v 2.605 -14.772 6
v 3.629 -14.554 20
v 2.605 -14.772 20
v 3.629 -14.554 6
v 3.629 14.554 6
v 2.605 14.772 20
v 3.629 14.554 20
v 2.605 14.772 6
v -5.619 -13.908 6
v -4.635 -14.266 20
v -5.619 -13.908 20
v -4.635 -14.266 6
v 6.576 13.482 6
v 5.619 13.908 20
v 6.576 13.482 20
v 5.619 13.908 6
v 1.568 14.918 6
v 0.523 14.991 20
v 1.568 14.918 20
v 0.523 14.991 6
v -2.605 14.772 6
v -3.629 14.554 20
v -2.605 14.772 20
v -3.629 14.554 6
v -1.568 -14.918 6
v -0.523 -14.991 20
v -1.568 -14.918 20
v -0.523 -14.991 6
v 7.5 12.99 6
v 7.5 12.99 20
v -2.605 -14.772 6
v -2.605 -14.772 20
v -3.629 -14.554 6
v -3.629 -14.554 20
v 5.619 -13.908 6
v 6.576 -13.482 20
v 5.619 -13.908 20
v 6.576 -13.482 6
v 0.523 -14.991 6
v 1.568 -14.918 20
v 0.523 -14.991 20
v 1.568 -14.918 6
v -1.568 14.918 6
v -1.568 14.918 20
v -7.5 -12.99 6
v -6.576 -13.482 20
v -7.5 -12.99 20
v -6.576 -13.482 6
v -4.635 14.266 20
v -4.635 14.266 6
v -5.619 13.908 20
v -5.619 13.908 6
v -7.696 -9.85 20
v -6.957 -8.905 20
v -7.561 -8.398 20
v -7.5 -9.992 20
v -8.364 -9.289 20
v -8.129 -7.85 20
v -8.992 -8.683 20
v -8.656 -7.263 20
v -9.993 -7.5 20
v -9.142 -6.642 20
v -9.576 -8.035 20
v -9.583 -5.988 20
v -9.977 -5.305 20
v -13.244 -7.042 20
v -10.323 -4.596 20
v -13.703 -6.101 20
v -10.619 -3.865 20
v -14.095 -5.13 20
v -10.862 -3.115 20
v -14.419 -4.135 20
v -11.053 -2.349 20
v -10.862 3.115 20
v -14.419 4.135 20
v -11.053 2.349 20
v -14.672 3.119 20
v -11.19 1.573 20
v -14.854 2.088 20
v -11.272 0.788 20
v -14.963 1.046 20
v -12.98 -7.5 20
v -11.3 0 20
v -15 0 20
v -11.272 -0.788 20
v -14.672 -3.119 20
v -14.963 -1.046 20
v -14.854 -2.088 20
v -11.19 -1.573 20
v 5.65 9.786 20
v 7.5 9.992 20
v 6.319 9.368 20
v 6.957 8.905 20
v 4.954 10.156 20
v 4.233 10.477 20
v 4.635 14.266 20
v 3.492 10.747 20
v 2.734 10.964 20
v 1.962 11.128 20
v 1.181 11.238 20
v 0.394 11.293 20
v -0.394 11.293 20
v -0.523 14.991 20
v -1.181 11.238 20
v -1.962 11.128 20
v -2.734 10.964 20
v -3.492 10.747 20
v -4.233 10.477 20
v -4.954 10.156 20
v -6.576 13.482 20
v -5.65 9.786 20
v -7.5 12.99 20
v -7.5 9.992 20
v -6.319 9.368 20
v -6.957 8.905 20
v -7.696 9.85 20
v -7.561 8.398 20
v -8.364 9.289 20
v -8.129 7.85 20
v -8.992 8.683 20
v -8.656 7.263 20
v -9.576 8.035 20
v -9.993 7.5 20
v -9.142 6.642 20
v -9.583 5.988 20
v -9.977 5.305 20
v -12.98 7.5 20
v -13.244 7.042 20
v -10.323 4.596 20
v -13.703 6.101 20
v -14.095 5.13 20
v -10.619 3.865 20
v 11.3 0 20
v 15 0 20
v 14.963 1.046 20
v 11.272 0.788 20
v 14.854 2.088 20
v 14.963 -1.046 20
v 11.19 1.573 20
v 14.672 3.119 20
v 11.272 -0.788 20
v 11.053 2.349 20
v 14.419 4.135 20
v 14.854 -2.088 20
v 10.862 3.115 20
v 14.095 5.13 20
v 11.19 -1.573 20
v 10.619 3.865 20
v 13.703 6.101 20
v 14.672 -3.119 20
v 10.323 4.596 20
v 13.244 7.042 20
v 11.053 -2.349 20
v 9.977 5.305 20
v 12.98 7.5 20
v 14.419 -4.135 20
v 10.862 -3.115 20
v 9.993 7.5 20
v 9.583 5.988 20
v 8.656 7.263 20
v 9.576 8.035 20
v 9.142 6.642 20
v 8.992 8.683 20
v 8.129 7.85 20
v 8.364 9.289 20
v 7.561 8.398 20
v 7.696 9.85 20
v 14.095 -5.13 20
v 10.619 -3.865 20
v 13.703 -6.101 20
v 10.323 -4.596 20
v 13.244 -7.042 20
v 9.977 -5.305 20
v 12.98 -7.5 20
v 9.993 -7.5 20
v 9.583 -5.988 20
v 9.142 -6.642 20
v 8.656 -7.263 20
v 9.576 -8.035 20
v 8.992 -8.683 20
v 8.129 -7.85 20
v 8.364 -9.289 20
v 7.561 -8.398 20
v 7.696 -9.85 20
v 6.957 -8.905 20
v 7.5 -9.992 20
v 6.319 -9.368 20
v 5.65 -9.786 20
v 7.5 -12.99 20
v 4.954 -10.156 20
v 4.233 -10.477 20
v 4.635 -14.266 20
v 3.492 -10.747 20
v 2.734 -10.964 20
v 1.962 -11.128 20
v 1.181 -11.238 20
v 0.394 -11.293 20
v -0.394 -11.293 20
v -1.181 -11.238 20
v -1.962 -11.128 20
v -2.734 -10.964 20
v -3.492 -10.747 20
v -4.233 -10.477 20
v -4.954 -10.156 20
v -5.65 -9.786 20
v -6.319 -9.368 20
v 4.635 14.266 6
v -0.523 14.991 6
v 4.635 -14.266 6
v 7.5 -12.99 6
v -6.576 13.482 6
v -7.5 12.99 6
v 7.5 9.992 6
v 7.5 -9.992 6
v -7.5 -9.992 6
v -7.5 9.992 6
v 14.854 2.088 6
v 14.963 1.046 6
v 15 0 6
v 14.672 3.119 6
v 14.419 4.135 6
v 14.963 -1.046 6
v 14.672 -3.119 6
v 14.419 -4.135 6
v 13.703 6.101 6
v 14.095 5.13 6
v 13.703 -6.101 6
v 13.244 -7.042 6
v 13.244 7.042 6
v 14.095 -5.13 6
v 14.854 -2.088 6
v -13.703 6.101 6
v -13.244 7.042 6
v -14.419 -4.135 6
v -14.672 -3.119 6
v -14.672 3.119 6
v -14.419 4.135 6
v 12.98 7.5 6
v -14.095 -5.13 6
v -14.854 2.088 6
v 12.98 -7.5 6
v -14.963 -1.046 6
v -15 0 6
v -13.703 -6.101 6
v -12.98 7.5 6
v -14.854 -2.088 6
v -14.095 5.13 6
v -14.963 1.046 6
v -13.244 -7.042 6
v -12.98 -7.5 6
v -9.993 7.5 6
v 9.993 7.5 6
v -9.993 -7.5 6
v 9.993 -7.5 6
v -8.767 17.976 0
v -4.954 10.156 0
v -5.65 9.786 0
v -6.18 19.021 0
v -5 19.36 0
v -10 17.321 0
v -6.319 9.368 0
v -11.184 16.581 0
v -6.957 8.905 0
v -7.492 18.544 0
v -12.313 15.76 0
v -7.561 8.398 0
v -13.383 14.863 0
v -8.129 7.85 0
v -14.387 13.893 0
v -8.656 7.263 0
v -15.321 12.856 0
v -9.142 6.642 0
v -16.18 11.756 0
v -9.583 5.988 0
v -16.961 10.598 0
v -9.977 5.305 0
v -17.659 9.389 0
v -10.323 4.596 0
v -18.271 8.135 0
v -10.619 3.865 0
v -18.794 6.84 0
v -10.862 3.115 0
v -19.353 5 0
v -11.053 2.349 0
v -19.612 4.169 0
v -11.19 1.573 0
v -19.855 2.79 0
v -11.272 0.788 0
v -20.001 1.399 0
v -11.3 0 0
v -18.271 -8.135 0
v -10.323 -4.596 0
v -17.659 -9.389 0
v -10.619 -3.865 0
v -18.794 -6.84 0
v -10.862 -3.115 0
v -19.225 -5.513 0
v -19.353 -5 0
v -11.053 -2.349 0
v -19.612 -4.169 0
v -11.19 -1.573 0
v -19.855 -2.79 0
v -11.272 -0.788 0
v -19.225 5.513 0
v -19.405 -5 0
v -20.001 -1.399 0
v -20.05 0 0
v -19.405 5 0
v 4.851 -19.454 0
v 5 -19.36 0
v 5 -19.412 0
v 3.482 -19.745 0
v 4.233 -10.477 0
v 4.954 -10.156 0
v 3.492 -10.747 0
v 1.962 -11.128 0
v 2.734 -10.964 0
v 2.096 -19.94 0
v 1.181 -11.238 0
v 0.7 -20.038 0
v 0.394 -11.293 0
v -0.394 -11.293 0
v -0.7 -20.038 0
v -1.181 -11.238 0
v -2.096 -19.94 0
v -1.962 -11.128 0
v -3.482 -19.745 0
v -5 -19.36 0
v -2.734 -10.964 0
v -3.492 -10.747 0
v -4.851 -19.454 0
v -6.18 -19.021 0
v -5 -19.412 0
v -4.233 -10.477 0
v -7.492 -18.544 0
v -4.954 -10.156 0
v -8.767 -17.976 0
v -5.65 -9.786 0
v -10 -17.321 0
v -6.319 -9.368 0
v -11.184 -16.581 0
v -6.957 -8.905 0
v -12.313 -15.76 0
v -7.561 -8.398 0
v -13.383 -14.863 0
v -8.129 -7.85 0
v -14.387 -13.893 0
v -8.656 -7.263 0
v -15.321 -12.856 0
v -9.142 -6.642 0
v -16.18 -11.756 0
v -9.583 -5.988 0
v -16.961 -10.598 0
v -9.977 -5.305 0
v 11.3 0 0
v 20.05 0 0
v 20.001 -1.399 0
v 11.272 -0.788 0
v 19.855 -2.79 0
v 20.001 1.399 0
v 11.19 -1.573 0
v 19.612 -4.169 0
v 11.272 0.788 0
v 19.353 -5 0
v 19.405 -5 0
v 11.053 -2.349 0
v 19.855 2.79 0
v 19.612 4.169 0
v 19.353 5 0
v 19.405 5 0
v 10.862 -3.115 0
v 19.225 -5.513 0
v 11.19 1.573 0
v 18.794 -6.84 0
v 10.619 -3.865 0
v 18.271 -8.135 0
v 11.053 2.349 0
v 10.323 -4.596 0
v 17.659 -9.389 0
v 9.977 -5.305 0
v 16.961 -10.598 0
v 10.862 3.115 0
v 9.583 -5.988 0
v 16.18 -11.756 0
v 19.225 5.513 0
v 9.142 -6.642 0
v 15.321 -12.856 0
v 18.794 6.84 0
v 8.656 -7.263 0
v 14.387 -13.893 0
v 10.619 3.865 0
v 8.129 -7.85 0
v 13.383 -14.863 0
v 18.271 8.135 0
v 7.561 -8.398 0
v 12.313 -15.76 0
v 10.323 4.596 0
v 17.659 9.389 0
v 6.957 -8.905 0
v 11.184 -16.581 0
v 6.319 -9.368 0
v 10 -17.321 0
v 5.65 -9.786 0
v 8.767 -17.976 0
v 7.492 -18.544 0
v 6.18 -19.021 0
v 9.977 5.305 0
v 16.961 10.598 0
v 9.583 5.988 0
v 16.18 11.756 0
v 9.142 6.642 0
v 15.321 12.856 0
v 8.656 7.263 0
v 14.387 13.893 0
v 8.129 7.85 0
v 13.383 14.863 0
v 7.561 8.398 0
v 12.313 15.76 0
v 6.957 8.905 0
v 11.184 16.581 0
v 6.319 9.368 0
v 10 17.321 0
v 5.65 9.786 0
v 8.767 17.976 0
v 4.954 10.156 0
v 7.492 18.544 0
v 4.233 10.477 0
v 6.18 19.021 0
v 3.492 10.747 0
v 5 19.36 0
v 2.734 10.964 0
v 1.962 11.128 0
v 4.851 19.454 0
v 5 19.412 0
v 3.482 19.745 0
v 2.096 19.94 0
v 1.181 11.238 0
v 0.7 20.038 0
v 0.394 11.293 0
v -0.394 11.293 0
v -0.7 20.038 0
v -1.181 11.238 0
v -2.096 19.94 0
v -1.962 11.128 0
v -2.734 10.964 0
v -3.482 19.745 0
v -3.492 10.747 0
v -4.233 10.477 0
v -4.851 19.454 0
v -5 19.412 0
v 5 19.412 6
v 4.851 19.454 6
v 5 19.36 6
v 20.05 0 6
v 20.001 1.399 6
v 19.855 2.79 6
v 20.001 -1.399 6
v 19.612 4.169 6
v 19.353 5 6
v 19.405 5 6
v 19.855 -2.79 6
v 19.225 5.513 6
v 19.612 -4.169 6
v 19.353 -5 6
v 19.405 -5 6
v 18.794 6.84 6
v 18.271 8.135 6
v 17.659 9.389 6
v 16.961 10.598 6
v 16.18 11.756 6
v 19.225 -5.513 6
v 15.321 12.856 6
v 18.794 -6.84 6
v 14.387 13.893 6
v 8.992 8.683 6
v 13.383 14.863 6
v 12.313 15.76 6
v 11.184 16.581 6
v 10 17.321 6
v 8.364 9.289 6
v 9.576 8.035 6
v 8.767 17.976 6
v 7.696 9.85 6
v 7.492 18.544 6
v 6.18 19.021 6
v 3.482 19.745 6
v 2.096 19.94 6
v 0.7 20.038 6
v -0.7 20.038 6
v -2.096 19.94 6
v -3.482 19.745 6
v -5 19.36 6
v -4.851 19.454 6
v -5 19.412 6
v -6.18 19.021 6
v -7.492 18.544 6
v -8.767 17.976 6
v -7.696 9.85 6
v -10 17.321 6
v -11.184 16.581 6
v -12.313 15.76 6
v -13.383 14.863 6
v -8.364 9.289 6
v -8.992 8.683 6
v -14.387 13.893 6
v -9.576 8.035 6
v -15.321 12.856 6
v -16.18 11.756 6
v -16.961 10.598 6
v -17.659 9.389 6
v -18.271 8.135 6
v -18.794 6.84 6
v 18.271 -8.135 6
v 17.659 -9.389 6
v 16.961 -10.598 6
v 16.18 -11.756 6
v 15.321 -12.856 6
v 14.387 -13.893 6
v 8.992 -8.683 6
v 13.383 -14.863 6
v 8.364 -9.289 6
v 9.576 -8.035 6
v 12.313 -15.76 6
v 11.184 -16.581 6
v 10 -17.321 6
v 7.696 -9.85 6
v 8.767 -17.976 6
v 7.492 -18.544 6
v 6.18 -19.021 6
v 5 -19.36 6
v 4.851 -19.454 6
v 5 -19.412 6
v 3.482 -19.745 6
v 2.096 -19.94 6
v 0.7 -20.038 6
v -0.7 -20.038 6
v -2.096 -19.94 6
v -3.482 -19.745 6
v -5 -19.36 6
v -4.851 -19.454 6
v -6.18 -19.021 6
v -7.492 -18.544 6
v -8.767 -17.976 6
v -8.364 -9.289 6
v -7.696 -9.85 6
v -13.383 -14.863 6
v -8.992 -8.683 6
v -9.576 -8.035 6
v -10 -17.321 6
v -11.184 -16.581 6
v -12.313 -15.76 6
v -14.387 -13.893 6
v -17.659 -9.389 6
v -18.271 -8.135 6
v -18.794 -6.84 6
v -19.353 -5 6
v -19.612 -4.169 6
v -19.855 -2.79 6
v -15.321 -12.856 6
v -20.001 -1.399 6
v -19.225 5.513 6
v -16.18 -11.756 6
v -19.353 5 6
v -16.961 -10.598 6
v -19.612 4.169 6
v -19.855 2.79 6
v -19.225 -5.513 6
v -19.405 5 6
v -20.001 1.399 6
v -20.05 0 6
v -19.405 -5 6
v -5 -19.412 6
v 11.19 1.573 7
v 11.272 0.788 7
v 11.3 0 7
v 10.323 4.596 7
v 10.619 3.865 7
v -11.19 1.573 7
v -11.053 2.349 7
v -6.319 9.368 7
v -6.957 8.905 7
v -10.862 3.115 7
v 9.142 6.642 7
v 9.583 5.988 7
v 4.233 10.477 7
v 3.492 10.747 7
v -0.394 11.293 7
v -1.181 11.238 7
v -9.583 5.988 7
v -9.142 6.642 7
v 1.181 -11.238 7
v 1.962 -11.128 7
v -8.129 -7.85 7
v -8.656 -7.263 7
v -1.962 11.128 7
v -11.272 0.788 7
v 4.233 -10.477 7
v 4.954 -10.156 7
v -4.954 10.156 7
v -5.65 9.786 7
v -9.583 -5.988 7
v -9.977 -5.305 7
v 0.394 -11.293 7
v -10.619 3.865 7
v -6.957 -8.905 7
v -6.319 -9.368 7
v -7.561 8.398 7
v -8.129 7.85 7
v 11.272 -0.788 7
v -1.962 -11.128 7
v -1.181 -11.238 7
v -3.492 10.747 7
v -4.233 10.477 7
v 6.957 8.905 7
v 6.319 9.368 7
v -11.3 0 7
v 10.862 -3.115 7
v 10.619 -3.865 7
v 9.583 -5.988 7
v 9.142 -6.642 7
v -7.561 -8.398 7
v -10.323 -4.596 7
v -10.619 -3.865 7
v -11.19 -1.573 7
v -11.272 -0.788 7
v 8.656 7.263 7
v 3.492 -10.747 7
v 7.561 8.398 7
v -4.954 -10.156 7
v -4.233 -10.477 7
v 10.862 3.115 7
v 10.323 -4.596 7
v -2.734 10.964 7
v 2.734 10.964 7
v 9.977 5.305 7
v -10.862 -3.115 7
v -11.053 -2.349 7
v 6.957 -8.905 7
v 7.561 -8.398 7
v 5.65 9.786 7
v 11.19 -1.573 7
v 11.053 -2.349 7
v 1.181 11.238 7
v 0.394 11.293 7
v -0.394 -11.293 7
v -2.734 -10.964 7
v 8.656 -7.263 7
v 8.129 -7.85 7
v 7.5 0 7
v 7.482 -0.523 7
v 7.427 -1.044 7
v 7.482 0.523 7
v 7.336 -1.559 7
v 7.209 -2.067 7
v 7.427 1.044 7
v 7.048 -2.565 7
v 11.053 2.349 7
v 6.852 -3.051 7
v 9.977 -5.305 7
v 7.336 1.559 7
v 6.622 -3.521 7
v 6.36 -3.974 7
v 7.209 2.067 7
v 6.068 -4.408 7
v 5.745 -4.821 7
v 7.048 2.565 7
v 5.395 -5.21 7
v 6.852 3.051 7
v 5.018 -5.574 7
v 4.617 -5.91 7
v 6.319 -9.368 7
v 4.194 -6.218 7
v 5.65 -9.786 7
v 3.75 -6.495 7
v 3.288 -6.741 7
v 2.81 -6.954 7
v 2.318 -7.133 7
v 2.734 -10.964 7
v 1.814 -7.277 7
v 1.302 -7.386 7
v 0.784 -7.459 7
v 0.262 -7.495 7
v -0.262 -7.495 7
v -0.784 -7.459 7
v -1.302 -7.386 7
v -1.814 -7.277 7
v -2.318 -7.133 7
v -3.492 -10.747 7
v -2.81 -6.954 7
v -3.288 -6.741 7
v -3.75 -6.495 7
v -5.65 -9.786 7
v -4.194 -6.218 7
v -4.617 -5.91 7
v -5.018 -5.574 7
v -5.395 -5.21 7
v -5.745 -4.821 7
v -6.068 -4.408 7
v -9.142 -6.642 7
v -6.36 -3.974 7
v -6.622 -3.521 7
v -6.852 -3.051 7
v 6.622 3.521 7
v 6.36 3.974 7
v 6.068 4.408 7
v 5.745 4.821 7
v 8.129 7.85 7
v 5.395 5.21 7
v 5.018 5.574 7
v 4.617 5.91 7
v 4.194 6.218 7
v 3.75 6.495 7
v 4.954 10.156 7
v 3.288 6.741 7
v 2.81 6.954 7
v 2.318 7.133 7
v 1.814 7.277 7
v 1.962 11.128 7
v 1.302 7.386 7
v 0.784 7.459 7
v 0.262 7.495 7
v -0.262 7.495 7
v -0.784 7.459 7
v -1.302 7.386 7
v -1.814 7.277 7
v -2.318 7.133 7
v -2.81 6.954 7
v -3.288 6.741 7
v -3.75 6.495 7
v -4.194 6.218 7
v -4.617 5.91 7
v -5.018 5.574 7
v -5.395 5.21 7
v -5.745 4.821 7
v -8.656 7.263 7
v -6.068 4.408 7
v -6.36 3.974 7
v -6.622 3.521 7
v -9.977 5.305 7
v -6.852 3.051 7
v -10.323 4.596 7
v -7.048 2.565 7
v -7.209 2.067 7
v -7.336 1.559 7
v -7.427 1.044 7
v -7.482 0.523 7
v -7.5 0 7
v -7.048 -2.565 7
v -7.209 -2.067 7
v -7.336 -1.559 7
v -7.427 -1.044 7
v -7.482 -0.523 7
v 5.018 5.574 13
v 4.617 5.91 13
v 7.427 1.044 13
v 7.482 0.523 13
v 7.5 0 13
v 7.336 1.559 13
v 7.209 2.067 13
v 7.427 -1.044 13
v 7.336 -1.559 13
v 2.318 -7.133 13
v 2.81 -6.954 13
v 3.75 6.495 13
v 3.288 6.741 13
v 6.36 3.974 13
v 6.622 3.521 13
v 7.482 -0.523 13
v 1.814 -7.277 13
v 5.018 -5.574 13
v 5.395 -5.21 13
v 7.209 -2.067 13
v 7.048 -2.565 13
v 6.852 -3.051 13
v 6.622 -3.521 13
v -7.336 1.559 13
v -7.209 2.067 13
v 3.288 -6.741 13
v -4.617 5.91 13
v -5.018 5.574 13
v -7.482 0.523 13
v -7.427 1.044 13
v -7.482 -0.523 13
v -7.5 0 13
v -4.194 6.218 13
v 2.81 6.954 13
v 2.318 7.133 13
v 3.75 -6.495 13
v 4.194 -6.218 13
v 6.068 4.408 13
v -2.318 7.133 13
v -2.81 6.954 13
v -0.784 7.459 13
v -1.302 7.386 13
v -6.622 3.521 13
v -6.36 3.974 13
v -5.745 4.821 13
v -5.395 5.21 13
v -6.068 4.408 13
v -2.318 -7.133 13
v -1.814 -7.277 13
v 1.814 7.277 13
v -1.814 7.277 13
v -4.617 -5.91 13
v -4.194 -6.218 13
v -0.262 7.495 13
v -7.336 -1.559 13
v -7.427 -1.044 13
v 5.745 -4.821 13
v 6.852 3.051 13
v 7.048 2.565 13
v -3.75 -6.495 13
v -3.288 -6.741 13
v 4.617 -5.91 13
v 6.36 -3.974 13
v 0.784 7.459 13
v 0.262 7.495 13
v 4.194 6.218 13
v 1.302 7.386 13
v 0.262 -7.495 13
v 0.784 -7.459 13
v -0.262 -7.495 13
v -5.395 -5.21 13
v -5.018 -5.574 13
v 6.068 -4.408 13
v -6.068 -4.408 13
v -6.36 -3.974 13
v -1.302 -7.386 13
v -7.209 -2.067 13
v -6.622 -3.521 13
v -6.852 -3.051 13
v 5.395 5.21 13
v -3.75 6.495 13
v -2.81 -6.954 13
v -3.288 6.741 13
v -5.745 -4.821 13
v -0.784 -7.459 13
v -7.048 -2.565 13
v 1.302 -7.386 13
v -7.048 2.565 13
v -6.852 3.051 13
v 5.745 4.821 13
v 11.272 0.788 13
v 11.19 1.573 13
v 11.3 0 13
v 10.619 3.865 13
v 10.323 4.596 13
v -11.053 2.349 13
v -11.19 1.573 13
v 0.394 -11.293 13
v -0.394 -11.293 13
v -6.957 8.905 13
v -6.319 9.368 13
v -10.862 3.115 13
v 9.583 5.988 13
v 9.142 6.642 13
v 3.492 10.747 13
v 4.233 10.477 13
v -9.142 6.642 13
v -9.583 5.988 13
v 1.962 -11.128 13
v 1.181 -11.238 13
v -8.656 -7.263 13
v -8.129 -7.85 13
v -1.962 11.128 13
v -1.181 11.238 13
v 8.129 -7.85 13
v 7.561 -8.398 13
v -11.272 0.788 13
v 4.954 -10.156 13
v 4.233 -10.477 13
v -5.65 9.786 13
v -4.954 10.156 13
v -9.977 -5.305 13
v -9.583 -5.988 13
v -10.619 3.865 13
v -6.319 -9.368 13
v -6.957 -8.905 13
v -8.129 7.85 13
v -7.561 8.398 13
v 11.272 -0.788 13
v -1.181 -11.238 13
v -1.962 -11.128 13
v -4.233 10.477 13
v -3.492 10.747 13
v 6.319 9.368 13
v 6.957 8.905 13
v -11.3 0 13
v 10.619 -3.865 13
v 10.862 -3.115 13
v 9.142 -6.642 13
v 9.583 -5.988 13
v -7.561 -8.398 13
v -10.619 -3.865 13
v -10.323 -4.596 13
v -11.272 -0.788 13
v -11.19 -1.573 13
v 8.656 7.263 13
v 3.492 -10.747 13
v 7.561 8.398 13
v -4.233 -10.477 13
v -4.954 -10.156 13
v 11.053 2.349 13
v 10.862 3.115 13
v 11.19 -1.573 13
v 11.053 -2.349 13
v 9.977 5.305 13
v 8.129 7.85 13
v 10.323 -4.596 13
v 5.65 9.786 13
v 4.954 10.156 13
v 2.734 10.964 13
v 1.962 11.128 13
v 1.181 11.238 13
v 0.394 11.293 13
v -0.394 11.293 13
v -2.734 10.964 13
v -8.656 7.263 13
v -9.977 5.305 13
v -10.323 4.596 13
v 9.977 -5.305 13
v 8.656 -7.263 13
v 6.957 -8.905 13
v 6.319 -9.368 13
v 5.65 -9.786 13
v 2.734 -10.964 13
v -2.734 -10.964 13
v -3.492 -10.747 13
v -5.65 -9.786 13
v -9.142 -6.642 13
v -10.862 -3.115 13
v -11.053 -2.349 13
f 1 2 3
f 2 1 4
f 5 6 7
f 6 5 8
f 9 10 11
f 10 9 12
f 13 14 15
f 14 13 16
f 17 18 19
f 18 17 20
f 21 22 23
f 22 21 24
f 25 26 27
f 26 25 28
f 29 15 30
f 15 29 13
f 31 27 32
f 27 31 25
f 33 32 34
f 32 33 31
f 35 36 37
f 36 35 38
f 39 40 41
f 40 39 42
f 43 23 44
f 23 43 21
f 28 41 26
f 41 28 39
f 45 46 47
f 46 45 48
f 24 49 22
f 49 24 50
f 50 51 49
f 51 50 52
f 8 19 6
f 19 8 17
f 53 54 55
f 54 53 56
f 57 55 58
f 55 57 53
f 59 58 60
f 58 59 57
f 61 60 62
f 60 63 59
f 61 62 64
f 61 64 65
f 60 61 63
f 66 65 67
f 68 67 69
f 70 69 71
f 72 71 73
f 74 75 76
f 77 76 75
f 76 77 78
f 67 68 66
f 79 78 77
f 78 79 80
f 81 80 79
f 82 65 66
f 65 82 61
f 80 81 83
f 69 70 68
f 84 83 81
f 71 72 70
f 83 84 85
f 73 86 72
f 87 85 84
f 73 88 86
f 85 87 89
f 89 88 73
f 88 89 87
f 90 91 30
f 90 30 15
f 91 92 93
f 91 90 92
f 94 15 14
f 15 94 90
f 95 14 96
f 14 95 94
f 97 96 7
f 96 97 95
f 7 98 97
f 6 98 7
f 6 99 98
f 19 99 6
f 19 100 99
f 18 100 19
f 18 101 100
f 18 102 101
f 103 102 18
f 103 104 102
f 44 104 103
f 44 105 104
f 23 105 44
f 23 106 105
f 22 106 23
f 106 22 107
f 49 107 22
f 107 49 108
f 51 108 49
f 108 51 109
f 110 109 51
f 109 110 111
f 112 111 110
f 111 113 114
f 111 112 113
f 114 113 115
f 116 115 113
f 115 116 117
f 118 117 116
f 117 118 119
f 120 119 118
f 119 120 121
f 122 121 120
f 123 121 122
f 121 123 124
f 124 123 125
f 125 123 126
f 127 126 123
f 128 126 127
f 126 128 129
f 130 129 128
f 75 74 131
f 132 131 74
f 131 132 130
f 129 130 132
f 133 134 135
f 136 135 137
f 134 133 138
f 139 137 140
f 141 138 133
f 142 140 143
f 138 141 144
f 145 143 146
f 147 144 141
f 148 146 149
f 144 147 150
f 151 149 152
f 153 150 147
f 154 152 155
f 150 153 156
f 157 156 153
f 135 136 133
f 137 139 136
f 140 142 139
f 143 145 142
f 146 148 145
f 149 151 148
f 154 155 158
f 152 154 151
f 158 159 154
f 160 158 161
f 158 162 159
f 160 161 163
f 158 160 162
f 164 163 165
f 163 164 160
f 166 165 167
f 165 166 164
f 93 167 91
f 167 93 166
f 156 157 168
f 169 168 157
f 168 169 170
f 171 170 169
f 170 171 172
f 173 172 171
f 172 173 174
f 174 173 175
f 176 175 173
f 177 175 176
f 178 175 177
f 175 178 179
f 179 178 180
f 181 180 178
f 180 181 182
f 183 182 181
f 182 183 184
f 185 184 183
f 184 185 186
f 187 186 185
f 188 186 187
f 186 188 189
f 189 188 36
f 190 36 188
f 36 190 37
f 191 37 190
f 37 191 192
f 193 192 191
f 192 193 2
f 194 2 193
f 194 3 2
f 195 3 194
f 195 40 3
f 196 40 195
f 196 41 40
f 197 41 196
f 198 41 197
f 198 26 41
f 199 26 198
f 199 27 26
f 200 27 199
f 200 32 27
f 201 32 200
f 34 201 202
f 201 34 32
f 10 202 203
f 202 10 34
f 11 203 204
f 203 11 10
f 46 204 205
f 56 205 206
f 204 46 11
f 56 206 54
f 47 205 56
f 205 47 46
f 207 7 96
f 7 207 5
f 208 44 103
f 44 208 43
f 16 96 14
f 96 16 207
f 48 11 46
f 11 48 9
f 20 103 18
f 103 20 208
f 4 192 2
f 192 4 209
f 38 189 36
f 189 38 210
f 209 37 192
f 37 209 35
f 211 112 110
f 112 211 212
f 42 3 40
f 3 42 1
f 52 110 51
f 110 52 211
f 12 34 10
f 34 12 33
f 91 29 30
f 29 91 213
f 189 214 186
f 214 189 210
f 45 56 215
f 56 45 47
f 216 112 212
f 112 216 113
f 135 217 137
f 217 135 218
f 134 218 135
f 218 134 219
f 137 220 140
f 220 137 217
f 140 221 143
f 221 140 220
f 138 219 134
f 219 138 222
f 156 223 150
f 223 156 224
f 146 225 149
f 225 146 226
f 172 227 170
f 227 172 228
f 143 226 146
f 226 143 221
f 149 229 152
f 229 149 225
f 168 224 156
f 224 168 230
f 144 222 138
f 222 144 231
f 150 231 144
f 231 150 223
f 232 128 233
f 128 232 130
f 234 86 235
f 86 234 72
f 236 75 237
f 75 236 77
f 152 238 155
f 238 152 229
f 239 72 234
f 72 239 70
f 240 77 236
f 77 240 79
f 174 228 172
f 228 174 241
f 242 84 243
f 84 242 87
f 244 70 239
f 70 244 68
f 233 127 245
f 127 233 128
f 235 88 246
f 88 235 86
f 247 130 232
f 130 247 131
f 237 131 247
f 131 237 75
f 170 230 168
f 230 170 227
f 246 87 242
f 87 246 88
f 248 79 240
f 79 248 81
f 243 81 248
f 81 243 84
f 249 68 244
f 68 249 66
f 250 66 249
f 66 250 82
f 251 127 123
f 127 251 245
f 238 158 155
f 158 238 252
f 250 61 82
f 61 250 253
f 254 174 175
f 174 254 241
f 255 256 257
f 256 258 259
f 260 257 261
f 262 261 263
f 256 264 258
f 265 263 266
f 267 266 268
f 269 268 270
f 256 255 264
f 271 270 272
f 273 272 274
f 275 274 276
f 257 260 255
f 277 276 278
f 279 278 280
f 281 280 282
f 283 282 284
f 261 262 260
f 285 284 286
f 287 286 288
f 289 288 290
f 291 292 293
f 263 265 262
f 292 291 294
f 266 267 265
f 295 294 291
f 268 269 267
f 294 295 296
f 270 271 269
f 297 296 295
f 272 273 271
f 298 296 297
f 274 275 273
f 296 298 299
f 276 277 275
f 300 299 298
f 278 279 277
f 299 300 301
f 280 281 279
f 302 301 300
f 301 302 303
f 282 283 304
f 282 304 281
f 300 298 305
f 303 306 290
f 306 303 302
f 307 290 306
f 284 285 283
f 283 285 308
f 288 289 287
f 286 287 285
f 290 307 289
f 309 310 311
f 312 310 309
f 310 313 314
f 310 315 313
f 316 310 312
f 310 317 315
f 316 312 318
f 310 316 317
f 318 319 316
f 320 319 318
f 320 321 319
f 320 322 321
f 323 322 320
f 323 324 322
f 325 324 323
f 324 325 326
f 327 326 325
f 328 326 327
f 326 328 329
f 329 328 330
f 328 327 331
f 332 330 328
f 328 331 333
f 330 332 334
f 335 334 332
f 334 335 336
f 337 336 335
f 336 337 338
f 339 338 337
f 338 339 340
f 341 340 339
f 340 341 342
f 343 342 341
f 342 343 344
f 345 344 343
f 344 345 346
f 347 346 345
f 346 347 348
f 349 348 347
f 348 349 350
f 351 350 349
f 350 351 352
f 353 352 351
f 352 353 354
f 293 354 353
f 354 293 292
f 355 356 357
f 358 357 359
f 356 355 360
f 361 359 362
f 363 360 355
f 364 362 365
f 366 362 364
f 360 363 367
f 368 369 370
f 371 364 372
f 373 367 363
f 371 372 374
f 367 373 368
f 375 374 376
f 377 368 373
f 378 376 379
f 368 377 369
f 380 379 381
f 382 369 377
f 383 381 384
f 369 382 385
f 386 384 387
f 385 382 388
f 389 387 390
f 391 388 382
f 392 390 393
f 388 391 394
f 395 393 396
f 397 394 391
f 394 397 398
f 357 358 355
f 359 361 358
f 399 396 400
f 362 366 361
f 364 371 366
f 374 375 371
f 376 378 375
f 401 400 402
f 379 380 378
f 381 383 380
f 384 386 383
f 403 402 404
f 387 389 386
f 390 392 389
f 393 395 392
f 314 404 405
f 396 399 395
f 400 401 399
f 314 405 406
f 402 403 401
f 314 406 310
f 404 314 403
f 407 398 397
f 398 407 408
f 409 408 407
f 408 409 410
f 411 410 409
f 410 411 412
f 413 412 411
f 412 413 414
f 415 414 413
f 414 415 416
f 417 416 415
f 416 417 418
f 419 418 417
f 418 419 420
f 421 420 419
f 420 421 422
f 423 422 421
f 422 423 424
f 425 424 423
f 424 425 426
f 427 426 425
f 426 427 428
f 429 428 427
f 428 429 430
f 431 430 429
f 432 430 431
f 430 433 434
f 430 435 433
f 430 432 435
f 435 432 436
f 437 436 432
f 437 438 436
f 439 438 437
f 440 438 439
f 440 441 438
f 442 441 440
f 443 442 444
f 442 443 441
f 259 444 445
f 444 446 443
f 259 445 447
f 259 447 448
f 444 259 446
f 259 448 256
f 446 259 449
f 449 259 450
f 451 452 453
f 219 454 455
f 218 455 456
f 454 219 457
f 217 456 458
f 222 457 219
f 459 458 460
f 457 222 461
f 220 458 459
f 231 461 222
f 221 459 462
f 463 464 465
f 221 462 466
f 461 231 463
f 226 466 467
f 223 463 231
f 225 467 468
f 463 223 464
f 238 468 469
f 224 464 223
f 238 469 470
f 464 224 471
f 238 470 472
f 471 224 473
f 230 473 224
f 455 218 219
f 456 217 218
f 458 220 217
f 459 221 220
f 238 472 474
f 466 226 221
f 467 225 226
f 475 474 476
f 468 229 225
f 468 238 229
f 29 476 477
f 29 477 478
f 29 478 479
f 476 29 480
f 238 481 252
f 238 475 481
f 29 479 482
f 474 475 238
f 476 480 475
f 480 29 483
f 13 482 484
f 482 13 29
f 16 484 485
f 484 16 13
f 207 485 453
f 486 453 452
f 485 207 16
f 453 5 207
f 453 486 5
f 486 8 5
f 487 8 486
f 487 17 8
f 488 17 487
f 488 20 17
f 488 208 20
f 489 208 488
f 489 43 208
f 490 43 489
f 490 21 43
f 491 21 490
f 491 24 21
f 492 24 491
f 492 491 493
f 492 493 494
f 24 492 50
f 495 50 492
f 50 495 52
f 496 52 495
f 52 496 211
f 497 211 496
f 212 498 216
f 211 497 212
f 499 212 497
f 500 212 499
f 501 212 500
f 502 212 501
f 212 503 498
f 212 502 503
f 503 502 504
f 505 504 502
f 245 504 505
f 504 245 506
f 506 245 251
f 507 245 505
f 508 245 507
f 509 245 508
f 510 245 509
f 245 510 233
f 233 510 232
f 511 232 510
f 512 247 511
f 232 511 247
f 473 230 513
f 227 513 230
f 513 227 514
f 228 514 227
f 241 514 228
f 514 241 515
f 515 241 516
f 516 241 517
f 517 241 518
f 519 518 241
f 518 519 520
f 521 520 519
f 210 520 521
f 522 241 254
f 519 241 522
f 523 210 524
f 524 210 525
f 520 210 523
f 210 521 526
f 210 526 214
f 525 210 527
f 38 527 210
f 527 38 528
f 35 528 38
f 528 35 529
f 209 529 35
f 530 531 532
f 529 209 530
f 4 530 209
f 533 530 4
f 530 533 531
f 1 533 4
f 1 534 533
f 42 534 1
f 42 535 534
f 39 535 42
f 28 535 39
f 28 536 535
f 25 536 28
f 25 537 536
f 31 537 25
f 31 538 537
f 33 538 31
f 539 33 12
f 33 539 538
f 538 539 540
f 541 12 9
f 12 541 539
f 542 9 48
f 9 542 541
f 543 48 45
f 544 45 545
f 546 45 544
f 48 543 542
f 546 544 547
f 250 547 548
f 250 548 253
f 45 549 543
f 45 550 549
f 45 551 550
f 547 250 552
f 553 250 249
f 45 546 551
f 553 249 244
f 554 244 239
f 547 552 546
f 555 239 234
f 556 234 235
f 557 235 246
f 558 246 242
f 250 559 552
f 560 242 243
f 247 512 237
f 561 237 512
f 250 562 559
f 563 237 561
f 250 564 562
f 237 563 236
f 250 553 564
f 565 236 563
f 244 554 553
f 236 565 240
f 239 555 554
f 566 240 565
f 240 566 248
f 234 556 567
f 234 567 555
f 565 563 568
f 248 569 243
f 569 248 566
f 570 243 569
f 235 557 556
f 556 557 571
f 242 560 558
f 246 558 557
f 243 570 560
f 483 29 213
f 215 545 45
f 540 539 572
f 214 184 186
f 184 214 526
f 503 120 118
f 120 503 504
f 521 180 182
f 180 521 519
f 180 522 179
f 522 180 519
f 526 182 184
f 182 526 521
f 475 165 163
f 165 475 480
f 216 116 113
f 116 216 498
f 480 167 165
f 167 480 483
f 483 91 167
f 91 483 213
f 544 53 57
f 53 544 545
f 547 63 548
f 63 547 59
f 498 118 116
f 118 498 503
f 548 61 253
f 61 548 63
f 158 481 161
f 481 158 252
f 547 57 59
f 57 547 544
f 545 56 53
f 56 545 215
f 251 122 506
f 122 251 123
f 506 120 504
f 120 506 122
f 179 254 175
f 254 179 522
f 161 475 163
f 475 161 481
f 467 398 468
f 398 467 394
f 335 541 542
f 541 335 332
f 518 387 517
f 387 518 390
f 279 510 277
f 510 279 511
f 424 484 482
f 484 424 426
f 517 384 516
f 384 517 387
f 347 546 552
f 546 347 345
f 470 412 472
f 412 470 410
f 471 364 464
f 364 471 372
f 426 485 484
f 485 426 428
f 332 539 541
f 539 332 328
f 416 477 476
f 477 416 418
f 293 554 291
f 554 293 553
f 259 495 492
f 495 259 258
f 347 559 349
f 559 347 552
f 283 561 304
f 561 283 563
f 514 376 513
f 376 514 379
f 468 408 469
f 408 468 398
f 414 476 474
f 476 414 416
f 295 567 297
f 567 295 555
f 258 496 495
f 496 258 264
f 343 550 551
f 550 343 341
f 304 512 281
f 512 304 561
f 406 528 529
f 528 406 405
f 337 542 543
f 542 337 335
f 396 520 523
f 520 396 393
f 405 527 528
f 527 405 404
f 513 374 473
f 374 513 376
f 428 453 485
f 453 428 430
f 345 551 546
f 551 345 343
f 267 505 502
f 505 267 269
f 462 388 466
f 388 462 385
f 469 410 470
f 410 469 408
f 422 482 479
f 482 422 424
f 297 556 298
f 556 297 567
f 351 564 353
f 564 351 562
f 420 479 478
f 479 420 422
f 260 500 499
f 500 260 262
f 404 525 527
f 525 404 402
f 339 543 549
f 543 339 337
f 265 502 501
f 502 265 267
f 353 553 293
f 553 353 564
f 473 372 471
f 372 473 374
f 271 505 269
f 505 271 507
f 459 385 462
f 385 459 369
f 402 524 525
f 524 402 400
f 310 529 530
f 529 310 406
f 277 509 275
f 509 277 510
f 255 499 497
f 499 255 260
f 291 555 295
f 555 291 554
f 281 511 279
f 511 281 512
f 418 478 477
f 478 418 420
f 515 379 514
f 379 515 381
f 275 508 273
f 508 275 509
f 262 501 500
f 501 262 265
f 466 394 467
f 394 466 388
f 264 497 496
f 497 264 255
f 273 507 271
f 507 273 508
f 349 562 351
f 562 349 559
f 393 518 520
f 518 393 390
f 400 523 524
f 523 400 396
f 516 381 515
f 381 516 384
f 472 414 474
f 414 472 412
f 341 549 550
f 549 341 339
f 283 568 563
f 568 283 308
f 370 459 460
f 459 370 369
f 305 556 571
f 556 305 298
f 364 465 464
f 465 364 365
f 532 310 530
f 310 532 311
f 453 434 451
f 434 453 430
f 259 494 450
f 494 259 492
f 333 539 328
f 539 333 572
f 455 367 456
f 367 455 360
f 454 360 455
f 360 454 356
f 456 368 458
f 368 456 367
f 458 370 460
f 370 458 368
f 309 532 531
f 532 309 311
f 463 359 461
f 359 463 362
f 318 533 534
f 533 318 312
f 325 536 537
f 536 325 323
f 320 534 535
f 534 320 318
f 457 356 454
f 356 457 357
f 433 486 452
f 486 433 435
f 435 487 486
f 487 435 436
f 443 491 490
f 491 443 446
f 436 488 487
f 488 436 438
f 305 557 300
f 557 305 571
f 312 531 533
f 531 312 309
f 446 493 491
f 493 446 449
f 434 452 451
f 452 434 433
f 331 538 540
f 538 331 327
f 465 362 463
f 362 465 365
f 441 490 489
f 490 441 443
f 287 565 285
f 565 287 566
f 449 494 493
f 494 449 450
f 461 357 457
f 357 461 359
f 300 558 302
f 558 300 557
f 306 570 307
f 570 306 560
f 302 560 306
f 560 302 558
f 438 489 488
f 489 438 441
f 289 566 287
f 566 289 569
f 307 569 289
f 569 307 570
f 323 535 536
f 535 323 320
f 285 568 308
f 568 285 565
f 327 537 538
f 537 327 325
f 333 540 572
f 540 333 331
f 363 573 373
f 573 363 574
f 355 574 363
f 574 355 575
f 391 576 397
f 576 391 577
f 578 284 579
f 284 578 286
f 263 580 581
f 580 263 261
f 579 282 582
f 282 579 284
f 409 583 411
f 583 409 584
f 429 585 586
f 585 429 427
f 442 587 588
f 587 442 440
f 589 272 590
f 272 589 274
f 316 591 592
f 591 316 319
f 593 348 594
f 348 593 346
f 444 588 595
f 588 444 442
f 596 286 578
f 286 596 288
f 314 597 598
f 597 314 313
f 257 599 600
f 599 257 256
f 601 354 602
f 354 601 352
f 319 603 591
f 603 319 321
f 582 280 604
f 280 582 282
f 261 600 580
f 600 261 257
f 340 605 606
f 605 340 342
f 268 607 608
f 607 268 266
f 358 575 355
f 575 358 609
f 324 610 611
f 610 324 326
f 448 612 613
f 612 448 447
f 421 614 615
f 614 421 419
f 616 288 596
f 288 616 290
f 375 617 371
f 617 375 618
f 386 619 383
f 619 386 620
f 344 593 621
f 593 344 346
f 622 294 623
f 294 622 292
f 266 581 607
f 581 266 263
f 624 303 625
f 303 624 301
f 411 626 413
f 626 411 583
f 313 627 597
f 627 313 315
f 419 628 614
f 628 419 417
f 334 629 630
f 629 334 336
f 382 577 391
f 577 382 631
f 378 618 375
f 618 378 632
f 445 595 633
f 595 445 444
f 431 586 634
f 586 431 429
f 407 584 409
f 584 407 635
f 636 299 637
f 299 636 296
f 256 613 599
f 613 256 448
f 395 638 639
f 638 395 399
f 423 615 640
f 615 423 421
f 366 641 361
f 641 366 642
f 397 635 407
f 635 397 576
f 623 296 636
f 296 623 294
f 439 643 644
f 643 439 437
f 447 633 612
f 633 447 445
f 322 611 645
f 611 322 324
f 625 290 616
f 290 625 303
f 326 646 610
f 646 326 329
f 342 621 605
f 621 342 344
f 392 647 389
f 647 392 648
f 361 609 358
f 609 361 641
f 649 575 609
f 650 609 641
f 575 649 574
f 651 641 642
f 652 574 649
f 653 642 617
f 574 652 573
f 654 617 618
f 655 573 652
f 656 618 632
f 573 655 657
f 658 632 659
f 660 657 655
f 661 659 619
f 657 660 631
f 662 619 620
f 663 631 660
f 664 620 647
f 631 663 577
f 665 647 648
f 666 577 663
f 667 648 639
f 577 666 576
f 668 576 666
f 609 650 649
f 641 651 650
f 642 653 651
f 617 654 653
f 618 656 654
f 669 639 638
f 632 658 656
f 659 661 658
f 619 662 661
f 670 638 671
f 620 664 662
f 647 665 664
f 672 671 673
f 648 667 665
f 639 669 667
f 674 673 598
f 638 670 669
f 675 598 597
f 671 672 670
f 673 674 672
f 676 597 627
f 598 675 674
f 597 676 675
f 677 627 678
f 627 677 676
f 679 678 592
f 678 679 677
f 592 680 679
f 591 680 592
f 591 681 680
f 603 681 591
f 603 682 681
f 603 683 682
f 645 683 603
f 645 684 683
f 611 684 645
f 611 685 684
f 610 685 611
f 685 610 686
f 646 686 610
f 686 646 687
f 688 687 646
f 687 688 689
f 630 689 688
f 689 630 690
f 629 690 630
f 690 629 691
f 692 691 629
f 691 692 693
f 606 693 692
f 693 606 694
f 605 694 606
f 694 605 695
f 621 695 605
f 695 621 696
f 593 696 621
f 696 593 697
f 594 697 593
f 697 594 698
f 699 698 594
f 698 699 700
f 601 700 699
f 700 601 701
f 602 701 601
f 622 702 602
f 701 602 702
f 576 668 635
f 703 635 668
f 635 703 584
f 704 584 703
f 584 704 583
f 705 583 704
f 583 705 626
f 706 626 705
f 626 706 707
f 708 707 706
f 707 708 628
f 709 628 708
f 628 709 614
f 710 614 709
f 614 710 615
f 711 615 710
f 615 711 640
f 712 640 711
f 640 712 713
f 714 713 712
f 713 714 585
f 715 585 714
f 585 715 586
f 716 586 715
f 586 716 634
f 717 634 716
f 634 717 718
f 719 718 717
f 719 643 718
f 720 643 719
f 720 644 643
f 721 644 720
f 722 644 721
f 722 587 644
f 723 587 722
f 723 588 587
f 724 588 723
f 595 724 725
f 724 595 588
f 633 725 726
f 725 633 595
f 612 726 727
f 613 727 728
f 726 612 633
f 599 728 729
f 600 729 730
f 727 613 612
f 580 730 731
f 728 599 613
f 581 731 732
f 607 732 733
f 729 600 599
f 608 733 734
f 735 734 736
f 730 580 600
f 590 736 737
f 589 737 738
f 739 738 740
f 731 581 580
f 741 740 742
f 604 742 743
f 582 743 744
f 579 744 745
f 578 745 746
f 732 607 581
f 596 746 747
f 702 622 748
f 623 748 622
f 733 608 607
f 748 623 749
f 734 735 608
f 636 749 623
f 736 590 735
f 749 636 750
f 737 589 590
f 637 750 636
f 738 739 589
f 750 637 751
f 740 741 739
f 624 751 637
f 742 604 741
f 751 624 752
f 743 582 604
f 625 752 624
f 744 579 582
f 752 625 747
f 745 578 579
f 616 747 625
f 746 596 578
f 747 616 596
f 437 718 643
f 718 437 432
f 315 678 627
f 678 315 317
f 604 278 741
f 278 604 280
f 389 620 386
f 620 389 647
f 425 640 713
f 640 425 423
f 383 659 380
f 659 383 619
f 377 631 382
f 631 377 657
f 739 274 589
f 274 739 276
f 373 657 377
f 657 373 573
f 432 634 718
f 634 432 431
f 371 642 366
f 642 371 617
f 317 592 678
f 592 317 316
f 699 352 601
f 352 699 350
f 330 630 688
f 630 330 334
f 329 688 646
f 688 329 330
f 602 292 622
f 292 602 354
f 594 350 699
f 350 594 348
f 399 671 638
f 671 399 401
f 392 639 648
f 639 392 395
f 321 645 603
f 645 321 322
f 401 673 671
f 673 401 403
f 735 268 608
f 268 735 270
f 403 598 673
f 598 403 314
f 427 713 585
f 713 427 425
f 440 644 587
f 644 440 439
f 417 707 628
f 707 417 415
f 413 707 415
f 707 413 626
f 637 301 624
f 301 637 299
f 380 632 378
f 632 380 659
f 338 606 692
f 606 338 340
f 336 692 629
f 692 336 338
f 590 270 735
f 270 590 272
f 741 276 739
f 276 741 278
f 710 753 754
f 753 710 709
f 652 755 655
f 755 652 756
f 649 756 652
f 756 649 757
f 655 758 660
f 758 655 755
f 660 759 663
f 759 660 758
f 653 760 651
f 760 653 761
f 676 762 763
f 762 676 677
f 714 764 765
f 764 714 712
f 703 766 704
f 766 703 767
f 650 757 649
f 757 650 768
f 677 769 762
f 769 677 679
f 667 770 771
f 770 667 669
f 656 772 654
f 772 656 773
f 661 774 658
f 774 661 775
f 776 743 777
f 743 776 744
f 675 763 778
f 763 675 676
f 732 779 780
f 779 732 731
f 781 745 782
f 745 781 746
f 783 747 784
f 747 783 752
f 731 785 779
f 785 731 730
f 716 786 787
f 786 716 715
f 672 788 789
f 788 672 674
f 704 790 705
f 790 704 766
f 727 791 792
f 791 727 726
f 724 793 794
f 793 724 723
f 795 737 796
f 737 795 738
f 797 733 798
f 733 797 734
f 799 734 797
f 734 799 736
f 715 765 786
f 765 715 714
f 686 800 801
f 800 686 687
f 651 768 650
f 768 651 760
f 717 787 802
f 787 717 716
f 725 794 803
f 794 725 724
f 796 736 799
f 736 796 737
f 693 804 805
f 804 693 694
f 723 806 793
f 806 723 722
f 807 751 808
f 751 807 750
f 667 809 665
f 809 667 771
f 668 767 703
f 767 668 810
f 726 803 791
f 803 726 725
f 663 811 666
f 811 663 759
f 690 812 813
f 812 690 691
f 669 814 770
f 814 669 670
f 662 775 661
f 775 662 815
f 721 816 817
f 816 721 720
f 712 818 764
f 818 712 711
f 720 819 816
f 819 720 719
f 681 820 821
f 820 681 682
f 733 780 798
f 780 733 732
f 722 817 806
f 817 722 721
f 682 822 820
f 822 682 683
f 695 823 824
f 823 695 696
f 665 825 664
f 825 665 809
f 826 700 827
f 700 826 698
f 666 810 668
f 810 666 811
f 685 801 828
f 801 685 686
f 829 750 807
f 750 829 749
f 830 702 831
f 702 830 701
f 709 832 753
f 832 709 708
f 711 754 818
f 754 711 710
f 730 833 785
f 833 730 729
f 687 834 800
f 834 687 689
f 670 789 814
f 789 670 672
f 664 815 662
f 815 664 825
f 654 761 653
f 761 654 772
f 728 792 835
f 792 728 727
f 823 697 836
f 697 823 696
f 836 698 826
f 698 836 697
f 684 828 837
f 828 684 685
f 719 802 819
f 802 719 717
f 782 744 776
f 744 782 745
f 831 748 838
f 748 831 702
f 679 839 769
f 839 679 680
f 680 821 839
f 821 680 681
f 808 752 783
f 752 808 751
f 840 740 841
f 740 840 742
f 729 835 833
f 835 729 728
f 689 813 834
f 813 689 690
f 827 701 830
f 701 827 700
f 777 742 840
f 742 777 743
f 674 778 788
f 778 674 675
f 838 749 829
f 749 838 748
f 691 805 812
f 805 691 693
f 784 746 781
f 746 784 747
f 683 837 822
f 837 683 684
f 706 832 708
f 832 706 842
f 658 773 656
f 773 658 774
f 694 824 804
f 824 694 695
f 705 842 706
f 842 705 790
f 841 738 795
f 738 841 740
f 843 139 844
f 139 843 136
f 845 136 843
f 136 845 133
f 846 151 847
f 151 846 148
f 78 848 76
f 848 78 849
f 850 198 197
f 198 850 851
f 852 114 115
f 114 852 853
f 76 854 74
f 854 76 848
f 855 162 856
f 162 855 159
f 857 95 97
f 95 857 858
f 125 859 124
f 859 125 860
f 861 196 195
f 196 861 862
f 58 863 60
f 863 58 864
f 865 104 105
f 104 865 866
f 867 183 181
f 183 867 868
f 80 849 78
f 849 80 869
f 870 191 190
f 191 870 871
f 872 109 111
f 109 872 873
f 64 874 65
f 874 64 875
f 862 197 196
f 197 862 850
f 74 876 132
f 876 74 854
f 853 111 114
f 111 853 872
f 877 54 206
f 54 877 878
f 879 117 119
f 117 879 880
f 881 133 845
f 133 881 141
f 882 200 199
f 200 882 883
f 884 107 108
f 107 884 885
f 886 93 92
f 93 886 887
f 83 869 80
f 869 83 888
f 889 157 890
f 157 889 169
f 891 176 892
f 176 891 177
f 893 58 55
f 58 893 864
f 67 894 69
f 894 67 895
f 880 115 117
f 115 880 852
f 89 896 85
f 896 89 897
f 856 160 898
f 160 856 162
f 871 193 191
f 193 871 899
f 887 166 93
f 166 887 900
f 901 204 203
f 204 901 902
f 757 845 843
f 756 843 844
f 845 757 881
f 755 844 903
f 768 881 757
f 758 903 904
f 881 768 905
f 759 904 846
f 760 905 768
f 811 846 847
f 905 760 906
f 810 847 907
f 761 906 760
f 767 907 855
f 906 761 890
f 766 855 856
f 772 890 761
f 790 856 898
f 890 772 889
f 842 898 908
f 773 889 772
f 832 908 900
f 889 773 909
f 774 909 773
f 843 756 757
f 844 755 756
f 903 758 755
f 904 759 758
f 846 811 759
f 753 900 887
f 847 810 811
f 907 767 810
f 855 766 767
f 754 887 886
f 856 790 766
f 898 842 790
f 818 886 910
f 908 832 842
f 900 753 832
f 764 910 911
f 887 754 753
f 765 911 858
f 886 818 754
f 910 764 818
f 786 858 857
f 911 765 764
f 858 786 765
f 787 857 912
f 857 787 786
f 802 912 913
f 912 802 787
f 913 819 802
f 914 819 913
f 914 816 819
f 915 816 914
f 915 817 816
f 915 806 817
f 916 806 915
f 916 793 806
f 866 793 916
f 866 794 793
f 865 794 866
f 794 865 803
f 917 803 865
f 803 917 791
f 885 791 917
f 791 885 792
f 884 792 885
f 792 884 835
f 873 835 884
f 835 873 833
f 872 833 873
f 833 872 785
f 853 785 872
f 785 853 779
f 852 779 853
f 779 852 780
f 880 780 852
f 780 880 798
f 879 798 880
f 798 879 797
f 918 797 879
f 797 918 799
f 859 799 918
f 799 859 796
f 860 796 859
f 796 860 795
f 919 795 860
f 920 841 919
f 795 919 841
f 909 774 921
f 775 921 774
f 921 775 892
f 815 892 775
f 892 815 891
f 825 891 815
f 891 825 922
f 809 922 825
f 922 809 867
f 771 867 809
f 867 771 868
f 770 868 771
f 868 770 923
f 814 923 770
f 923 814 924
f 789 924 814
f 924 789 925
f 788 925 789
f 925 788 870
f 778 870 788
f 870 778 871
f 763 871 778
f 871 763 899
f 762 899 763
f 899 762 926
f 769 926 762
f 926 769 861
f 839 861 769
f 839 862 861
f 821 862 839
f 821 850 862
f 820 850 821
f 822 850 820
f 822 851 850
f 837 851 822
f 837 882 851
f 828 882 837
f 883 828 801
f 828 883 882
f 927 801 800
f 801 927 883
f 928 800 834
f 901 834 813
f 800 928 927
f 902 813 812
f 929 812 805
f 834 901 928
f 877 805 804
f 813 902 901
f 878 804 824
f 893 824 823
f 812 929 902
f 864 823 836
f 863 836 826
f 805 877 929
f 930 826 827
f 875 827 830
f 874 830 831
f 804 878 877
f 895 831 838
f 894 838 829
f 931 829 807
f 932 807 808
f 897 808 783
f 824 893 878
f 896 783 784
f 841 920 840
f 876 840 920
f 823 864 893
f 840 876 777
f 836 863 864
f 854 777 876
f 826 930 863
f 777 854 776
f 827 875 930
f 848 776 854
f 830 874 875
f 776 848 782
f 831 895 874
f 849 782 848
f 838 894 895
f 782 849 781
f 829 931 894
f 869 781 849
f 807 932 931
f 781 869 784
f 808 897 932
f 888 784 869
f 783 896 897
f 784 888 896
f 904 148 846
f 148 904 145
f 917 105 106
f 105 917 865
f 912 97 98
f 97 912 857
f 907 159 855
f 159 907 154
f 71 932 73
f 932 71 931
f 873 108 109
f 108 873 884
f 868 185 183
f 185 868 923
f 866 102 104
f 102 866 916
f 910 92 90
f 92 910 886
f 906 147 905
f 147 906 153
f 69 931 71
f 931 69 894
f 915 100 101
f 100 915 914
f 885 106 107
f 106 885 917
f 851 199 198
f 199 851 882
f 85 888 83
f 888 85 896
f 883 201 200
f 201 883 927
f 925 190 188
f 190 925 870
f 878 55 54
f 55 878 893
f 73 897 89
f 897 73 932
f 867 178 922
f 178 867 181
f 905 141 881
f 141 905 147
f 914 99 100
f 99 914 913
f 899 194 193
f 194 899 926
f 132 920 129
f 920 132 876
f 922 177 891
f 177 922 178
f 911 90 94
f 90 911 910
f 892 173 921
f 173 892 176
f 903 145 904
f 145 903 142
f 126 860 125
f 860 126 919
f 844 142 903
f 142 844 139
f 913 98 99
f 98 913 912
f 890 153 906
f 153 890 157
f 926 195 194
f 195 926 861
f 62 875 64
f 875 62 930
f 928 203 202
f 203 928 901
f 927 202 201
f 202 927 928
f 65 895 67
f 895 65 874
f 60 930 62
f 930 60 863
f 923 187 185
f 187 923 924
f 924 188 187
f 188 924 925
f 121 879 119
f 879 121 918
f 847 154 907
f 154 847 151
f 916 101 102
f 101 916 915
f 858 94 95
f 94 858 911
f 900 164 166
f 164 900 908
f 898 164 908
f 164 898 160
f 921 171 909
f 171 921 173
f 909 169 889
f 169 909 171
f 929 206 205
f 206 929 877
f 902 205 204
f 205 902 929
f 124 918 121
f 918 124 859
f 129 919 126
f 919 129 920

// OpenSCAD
// file: slot_fill.scad
module slot_fill(length = 20) {
  difference() {
    translate([0, 0, 0]) rotate([0, 0, 0]) cylinder(r=4.5, h=length, center=true,  $fn=4);	
    //plane sides
	translate([-3.8, 0, 0]) rotate([0, 0, 0]) cube([4, 20, length*2], center=true);
	translate([3, 0, 0]) rotate([0, 0, 0]) cube([6, 20, length*2], center=true);
  }
}
// main file
include <MCAD/shapes.scad>
include <slot_fill.scad>


module fhex(wid,height){
  hull(){
    cube([wid/1.7,wid,height],center=true);
    rotate([0,0,120]) cube([wid/1.7,wid,height], center=true);
    rotate([0,0,240]) cube([wid/1.7,wid,height], center=true);
  }
}

module bearing(dia=22,hole=8,thinkness=7){
  color("silver")
  difference(){
    cylinder(d=dia, h=thinkness, $fn=60, center=true);
    cylinder(d=hole, h=thinkness+0.2, $fn=60, center=true);
  }
}

module refill3d_spool(){
  color("white")
  difference(){
    union(){
      translate([0,0,-45]) cylinder(d=160, h=3.0, $fn=360, center=true);
      translate([0,0,0]) cylinder(d=50, h=90, $fn=360, center=true);
      translate([0,0,45]) cylinder(d=160, h=3.0, $fn=360, center=true);
    }
    translate([0,0,0]) cylinder(d=32, h=93.2, $fn=360, center=true);
  }
}

module filament_spool(){
  color("black")
  difference(){
    union(){
      translate([0,0,-30]) cylinder(d=205, h=3.85, $fn=360, center=true);
      translate([0,0,0]) cylinder(d=90, h=64, $fn=360, center=true);
      translate([0,0,30]) cylinder(d=205, h=3.85, $fn=360, center=true);
    }
    translate([0,0,0]) cylinder(d=54, h=64.2, $fn=360, center=true);
  }
}

module spool_holder(printable=false, version=1){
  difference(){
    union(){
      translate([0,0,3]) cylinder(d=125, h=6, $fn=360, center=true);
      translate([0,0,10]) cylinder(d=25, h=20, $fn=90, center=true);
        
      intersection(){
        translate([0,0,12.5]) cylinder(d=30, h=15, $fn=90, center=true);
        translate([0,0,12.5]) cube([15,40,15], center=true);
      }
      intersection(){
        translate([0,0,12.5]) cylinder(d=30, h=15, $fn=90, center=true);
        translate([0,0,12.5]) cube([40,15,15], center=true);
      }
    }
    
    
    translate([0,0,85]) cylinder(d=9, h=180, $fn=90, center=true);
    translate([0,0,3]) cylinder(d=22.6, h=8, $fn=90, center=true);
    translate([0,0,5]) cylinder(d=15, h=18, $fn=90, center=true);
    translate([0,0,17]) cylinder(d=22.6, h=8, $fn=90, center=true);
//    translate([0,0,15]) cylinder(d=20, h=8, $fn=90, center=true);
    
    translate([0,0,4]) 
    difference(){
      cylinder(d=110, h=10, $fn=90, center=true);
      cylinder(d=40, h=10.02, $fn=90, center=true);
    
      cube([115,10,10.02], center=true);
      cube([10,115,10.02], center=true);
    }
    if(version==2){
      difference(){
        translate([0,0,3]) cylinder(d=126, h=12, $fn=90, center=true);
        translate([0,0,3]) cylinder(d=40.1, h=14, $fn=90, center=true);
      }
    }
  }
  
  if(printable){
    translate([0,0,7.15]) cylinder(d=23, h=0.3, $fn=30, center=true);
//    translate([0,0,9.15]) cylinder(d=12, h=0.3, $fn=30, center=true);
  }
}


module spool_arm(type=2){
  difference(){
    union(){
      translate([0,0,8.5]) cylinder(d=20, h=16, $fn=60, center=true);
      hull(){
        for(X=[-10,10], Y=[-10,10], Z=[2,12]){
          translate([X,Y,Z]) sphere(d=4, $fn=30, center=true);
        }
        for(X=[5,-5], Y=[120], Z=[2,8]){
           translate([X,Y,Z]) sphere(d=4, $fn=30, center=true);
        }
      }
      hull(){
        translate([0,115,70]) sphere(d=12,center=true);
        translate([0,115,4]) cylinder(d=12, h=1, $fn=60, center=true);
      }
    }
    translate([0,0,1.5]) cylinder(d=8.01, h=4.2, $fn=60, center=true);
    if(type==1){
      translate([0,123,65]) rotate([90,0,0]) cylinder(d1=20, d2=13, h=10, $fn=60, center=true);
      translate([0,115,65]) rotate([90,0,0]) cylinder(d=5.5, h=20, $fn=60, center=true);
    }
    else if(type==2){
      translate([-5,120,65]) rotate([90,0,45]) cylinder(d1=20, d2=13, h=10, $fn=60, center=true);
      translate([0,115,65]) rotate([90,0,45]) cylinder(d=5.5, h=20, $fn=60, center=true);
    }
    translate([0,0,13.5]) fhex(12.3,20);
  }
}

module spool_assembly_holders(offset=30){
  translate([0,0,0]) rotate([0,90,0]) bearing();
  translate([3,0,0]) rotate([0,90,180]) spool_holder();
  translate([-14,0,0]) rotate([0,90,0]) bearing();
}

module coupler(){
  //11.82x29.48
  difference(){
    fhex(12,29.5);
    cylinder(d=7,h=30, $fn=60, center=true);
  }
}

module spool_nut(printable=false){
//  translate([0,0,5]) coupler();
  difference(){
    union(){
//      translate([0,0,17.5]) cylinder(d1=45, d2=10, h=15, $fn=120, center=true);
      translate([0,0,5]) cylinder(d=35,h=10, $fn=120, center=true);
      for(R=[0,120, 240]){
        hull(){
          translate([0,0,5]) cylinder(d=20,h=10, $fn=60, center=true);
          rotate([0,0,R]) translate([40,0,5]) cylinder(d=20,h=10, $fn=60, center=true);
        }
      }
    }
    translate([0,0,14]) cylinder(d=8,h=30,$fn=60,center=true);
    translate([0,0,5]) fhex(12.3,29.5);
  }
  if(printable){
    translate([0,0,19.9]) cylinder(d=12, h=0.3, $fn=30, center=true);
  }
}

module standard_spool(fudge=1.5,printable=true,type=1){
  difference(){
    union(){
      translate([0,0,2]) cylinder(d=60, h=4, $fn=90, center=true);
      if(type==1){
        translate([0,0,14]) cylinder(d=56, h=20, $fn=90, center=true);
      }
      else if(type==2){
        translate([0,0,14]) cylinder(d=50, h=20, $fn=90, center=true);
      }
      else if(type==3){
        translate([0,0,14]) cylinder(d1=56, d2=50, h=20, $fn=120, center=true);
      }
    }
    translate([0,0,0]) cylinder(d=40+fudge, h=14, $fn=90, center=true);
    union(){
      intersection(){
        translate([0,0,12.5+fudge]) cylinder(d=30+fudge, h=15, $fn=90, center=true);
        translate([0,0,12.5+fudge]) cube([15+fudge,40,15], center=true);
      }
      intersection(){
        translate([0,0,12.5+fudge]) cylinder(d=30+fudge, h=15, $fn=90, center=true);
        translate([0,0,12.5+fudge]) cube([40,15+fudge,15], center=true);
      }
      translate([0,0,11.5]) cylinder(d=25+fudge, h=20, $fn=90, center=true);
    }
    translate([0,0,25]) cylinder(d=22, h=10, $fn=90, center=true);
  }
  if(printable){
    translate([0,0,7.15]) cylinder(d=40, h=0.3, $fn=30, center=true);
    translate([0,0,21.15]) cylinder(d=23, h=0.3, $fn=30, center=true);
  }
}

module pb_mount(){
//    translate([0,0,15]) %cube([90,15,30], center=true);
  R=2;
  difference(){
    hull(){  
      for(X=[-(95/2)+R,(95/2)-R], Y=[-7.5+R,7.5-R], Z=[0+R,30-R]){
        translate([X,Y,Z]) sphere(d=4,$fn=30);
      }
    }
    translate([-40.5,0,18]) rotate([90,0,0]) cylinder(d=3.4, h=16, $fn=30, center=true);
    translate([40.5,0,18]) rotate([90,0,0]) cylinder(d=3.4, h=16, $fn=30, center=true);
    for(X=[-25,25]){
      hull(){
        translate([X,0,5]) rotate([90,0,0]) cylinder(d=10, h=16, $fn=30, center=true);
        translate([X,0,-5]) rotate([90,0,0]) cylinder(d=10, h=16, $fn=30, center=true);
      }
    }
    translate([0,6,15]) rotate([90,0,0]) fhex(12.3,10);
    translate([0,0,15]) rotate([90,0,0]) cylinder(d=8.5, h=16, $fn=30, center=true);
  }
}

module spool_assembly(type=1){
  translate([-80,0,0]) rotate([0,90,0]) color("silver") cylinder(d=8, h=160, $fn=60, center=true);
  
  translate([-5,0,0]) rotate([0,90,0]) color("silver") fhex(13,7);
  translate([-12.5,0,0]) rotate([0,270,0]) spool_arm();
  translate([-20.1,0,0]) rotate([0,90,0]) color("silver") fhex(13,7);
  translate([-27.2,0,0]) rotate([0,90,0]) color("silver") fhex(13,7);
  
  translate([-35,0,0]) 
  if(type == 1){
    spool_assembly_holders();
    translate([-37,0,0]) rotate([0,90,180]) filament_spool();
    translate([-73,0,0]) rotate([0,0,180]) spool_assembly_holders();
    translate([-102,0,0]) rotate([0,90,0]) spool_nut();
  }
  else if(type == 2){
    spool_assembly_holders();
    translate([-50,0,0]) rotate([0,90,180]) refill3d_spool();
    translate([-100,0,0]) rotate([0,0,180]) spool_assembly_holders();
    translate([-130,0,0]) rotate([0,90,0]) spool_nut();
  }
}




module spool_mount_2020(){
  difference(){
    union(){
      translate([-10,20,42.5])
      hull(){
        for(Y=[-1,1], Z=[-1,1]){
          translate([10,5*Y,20*Z]) rotate([0,90,0]) cylinder(d=10, h=20, center=true, $fn=30);
          translate([10,5*Y,20*Z]) rotate([0,90,0]) cylinder(d=10, h=20, center=true, $fn=30);
        }
      }
      translate([0,12,42])
      hull(){
        for(Z=[-1,1]){
          translate([0,0,40*Z]) rotate([0,90,0]) cylinder(d=5, h=20, center=true, $fn=30);
        }
      }
      translate([0,9.5,42]) rotate([0,0,90]) slot_fill(length=78);
    }

    translate([0,14,42]) rotate([90,90,0]) fhex(12.3,15);
    translate([0,20,42]) rotate([90,0,0]) cylinder(d=8.5, h=25, $fn=30, center=true);
    
    translate([0,10,75]) rotate([90,0,0]) cylinder(d=6, h=10, center=true, $fn=30);
    translate([0,10,10]) rotate([90,0,0]) cylinder(d=6, h=10, center=true, $fn=30);
  }
}

//spool_mount_2020();
//pb_mount();
//spool_nut(printable=true);
//spool_assembly(type=2);
//spool_arm();
//standard_spool(printable=true,type=3);
spool_holder(printable=false,version=2);
//rotate([90,0,0]) pb_mount();
//spool_assembly_holders();
